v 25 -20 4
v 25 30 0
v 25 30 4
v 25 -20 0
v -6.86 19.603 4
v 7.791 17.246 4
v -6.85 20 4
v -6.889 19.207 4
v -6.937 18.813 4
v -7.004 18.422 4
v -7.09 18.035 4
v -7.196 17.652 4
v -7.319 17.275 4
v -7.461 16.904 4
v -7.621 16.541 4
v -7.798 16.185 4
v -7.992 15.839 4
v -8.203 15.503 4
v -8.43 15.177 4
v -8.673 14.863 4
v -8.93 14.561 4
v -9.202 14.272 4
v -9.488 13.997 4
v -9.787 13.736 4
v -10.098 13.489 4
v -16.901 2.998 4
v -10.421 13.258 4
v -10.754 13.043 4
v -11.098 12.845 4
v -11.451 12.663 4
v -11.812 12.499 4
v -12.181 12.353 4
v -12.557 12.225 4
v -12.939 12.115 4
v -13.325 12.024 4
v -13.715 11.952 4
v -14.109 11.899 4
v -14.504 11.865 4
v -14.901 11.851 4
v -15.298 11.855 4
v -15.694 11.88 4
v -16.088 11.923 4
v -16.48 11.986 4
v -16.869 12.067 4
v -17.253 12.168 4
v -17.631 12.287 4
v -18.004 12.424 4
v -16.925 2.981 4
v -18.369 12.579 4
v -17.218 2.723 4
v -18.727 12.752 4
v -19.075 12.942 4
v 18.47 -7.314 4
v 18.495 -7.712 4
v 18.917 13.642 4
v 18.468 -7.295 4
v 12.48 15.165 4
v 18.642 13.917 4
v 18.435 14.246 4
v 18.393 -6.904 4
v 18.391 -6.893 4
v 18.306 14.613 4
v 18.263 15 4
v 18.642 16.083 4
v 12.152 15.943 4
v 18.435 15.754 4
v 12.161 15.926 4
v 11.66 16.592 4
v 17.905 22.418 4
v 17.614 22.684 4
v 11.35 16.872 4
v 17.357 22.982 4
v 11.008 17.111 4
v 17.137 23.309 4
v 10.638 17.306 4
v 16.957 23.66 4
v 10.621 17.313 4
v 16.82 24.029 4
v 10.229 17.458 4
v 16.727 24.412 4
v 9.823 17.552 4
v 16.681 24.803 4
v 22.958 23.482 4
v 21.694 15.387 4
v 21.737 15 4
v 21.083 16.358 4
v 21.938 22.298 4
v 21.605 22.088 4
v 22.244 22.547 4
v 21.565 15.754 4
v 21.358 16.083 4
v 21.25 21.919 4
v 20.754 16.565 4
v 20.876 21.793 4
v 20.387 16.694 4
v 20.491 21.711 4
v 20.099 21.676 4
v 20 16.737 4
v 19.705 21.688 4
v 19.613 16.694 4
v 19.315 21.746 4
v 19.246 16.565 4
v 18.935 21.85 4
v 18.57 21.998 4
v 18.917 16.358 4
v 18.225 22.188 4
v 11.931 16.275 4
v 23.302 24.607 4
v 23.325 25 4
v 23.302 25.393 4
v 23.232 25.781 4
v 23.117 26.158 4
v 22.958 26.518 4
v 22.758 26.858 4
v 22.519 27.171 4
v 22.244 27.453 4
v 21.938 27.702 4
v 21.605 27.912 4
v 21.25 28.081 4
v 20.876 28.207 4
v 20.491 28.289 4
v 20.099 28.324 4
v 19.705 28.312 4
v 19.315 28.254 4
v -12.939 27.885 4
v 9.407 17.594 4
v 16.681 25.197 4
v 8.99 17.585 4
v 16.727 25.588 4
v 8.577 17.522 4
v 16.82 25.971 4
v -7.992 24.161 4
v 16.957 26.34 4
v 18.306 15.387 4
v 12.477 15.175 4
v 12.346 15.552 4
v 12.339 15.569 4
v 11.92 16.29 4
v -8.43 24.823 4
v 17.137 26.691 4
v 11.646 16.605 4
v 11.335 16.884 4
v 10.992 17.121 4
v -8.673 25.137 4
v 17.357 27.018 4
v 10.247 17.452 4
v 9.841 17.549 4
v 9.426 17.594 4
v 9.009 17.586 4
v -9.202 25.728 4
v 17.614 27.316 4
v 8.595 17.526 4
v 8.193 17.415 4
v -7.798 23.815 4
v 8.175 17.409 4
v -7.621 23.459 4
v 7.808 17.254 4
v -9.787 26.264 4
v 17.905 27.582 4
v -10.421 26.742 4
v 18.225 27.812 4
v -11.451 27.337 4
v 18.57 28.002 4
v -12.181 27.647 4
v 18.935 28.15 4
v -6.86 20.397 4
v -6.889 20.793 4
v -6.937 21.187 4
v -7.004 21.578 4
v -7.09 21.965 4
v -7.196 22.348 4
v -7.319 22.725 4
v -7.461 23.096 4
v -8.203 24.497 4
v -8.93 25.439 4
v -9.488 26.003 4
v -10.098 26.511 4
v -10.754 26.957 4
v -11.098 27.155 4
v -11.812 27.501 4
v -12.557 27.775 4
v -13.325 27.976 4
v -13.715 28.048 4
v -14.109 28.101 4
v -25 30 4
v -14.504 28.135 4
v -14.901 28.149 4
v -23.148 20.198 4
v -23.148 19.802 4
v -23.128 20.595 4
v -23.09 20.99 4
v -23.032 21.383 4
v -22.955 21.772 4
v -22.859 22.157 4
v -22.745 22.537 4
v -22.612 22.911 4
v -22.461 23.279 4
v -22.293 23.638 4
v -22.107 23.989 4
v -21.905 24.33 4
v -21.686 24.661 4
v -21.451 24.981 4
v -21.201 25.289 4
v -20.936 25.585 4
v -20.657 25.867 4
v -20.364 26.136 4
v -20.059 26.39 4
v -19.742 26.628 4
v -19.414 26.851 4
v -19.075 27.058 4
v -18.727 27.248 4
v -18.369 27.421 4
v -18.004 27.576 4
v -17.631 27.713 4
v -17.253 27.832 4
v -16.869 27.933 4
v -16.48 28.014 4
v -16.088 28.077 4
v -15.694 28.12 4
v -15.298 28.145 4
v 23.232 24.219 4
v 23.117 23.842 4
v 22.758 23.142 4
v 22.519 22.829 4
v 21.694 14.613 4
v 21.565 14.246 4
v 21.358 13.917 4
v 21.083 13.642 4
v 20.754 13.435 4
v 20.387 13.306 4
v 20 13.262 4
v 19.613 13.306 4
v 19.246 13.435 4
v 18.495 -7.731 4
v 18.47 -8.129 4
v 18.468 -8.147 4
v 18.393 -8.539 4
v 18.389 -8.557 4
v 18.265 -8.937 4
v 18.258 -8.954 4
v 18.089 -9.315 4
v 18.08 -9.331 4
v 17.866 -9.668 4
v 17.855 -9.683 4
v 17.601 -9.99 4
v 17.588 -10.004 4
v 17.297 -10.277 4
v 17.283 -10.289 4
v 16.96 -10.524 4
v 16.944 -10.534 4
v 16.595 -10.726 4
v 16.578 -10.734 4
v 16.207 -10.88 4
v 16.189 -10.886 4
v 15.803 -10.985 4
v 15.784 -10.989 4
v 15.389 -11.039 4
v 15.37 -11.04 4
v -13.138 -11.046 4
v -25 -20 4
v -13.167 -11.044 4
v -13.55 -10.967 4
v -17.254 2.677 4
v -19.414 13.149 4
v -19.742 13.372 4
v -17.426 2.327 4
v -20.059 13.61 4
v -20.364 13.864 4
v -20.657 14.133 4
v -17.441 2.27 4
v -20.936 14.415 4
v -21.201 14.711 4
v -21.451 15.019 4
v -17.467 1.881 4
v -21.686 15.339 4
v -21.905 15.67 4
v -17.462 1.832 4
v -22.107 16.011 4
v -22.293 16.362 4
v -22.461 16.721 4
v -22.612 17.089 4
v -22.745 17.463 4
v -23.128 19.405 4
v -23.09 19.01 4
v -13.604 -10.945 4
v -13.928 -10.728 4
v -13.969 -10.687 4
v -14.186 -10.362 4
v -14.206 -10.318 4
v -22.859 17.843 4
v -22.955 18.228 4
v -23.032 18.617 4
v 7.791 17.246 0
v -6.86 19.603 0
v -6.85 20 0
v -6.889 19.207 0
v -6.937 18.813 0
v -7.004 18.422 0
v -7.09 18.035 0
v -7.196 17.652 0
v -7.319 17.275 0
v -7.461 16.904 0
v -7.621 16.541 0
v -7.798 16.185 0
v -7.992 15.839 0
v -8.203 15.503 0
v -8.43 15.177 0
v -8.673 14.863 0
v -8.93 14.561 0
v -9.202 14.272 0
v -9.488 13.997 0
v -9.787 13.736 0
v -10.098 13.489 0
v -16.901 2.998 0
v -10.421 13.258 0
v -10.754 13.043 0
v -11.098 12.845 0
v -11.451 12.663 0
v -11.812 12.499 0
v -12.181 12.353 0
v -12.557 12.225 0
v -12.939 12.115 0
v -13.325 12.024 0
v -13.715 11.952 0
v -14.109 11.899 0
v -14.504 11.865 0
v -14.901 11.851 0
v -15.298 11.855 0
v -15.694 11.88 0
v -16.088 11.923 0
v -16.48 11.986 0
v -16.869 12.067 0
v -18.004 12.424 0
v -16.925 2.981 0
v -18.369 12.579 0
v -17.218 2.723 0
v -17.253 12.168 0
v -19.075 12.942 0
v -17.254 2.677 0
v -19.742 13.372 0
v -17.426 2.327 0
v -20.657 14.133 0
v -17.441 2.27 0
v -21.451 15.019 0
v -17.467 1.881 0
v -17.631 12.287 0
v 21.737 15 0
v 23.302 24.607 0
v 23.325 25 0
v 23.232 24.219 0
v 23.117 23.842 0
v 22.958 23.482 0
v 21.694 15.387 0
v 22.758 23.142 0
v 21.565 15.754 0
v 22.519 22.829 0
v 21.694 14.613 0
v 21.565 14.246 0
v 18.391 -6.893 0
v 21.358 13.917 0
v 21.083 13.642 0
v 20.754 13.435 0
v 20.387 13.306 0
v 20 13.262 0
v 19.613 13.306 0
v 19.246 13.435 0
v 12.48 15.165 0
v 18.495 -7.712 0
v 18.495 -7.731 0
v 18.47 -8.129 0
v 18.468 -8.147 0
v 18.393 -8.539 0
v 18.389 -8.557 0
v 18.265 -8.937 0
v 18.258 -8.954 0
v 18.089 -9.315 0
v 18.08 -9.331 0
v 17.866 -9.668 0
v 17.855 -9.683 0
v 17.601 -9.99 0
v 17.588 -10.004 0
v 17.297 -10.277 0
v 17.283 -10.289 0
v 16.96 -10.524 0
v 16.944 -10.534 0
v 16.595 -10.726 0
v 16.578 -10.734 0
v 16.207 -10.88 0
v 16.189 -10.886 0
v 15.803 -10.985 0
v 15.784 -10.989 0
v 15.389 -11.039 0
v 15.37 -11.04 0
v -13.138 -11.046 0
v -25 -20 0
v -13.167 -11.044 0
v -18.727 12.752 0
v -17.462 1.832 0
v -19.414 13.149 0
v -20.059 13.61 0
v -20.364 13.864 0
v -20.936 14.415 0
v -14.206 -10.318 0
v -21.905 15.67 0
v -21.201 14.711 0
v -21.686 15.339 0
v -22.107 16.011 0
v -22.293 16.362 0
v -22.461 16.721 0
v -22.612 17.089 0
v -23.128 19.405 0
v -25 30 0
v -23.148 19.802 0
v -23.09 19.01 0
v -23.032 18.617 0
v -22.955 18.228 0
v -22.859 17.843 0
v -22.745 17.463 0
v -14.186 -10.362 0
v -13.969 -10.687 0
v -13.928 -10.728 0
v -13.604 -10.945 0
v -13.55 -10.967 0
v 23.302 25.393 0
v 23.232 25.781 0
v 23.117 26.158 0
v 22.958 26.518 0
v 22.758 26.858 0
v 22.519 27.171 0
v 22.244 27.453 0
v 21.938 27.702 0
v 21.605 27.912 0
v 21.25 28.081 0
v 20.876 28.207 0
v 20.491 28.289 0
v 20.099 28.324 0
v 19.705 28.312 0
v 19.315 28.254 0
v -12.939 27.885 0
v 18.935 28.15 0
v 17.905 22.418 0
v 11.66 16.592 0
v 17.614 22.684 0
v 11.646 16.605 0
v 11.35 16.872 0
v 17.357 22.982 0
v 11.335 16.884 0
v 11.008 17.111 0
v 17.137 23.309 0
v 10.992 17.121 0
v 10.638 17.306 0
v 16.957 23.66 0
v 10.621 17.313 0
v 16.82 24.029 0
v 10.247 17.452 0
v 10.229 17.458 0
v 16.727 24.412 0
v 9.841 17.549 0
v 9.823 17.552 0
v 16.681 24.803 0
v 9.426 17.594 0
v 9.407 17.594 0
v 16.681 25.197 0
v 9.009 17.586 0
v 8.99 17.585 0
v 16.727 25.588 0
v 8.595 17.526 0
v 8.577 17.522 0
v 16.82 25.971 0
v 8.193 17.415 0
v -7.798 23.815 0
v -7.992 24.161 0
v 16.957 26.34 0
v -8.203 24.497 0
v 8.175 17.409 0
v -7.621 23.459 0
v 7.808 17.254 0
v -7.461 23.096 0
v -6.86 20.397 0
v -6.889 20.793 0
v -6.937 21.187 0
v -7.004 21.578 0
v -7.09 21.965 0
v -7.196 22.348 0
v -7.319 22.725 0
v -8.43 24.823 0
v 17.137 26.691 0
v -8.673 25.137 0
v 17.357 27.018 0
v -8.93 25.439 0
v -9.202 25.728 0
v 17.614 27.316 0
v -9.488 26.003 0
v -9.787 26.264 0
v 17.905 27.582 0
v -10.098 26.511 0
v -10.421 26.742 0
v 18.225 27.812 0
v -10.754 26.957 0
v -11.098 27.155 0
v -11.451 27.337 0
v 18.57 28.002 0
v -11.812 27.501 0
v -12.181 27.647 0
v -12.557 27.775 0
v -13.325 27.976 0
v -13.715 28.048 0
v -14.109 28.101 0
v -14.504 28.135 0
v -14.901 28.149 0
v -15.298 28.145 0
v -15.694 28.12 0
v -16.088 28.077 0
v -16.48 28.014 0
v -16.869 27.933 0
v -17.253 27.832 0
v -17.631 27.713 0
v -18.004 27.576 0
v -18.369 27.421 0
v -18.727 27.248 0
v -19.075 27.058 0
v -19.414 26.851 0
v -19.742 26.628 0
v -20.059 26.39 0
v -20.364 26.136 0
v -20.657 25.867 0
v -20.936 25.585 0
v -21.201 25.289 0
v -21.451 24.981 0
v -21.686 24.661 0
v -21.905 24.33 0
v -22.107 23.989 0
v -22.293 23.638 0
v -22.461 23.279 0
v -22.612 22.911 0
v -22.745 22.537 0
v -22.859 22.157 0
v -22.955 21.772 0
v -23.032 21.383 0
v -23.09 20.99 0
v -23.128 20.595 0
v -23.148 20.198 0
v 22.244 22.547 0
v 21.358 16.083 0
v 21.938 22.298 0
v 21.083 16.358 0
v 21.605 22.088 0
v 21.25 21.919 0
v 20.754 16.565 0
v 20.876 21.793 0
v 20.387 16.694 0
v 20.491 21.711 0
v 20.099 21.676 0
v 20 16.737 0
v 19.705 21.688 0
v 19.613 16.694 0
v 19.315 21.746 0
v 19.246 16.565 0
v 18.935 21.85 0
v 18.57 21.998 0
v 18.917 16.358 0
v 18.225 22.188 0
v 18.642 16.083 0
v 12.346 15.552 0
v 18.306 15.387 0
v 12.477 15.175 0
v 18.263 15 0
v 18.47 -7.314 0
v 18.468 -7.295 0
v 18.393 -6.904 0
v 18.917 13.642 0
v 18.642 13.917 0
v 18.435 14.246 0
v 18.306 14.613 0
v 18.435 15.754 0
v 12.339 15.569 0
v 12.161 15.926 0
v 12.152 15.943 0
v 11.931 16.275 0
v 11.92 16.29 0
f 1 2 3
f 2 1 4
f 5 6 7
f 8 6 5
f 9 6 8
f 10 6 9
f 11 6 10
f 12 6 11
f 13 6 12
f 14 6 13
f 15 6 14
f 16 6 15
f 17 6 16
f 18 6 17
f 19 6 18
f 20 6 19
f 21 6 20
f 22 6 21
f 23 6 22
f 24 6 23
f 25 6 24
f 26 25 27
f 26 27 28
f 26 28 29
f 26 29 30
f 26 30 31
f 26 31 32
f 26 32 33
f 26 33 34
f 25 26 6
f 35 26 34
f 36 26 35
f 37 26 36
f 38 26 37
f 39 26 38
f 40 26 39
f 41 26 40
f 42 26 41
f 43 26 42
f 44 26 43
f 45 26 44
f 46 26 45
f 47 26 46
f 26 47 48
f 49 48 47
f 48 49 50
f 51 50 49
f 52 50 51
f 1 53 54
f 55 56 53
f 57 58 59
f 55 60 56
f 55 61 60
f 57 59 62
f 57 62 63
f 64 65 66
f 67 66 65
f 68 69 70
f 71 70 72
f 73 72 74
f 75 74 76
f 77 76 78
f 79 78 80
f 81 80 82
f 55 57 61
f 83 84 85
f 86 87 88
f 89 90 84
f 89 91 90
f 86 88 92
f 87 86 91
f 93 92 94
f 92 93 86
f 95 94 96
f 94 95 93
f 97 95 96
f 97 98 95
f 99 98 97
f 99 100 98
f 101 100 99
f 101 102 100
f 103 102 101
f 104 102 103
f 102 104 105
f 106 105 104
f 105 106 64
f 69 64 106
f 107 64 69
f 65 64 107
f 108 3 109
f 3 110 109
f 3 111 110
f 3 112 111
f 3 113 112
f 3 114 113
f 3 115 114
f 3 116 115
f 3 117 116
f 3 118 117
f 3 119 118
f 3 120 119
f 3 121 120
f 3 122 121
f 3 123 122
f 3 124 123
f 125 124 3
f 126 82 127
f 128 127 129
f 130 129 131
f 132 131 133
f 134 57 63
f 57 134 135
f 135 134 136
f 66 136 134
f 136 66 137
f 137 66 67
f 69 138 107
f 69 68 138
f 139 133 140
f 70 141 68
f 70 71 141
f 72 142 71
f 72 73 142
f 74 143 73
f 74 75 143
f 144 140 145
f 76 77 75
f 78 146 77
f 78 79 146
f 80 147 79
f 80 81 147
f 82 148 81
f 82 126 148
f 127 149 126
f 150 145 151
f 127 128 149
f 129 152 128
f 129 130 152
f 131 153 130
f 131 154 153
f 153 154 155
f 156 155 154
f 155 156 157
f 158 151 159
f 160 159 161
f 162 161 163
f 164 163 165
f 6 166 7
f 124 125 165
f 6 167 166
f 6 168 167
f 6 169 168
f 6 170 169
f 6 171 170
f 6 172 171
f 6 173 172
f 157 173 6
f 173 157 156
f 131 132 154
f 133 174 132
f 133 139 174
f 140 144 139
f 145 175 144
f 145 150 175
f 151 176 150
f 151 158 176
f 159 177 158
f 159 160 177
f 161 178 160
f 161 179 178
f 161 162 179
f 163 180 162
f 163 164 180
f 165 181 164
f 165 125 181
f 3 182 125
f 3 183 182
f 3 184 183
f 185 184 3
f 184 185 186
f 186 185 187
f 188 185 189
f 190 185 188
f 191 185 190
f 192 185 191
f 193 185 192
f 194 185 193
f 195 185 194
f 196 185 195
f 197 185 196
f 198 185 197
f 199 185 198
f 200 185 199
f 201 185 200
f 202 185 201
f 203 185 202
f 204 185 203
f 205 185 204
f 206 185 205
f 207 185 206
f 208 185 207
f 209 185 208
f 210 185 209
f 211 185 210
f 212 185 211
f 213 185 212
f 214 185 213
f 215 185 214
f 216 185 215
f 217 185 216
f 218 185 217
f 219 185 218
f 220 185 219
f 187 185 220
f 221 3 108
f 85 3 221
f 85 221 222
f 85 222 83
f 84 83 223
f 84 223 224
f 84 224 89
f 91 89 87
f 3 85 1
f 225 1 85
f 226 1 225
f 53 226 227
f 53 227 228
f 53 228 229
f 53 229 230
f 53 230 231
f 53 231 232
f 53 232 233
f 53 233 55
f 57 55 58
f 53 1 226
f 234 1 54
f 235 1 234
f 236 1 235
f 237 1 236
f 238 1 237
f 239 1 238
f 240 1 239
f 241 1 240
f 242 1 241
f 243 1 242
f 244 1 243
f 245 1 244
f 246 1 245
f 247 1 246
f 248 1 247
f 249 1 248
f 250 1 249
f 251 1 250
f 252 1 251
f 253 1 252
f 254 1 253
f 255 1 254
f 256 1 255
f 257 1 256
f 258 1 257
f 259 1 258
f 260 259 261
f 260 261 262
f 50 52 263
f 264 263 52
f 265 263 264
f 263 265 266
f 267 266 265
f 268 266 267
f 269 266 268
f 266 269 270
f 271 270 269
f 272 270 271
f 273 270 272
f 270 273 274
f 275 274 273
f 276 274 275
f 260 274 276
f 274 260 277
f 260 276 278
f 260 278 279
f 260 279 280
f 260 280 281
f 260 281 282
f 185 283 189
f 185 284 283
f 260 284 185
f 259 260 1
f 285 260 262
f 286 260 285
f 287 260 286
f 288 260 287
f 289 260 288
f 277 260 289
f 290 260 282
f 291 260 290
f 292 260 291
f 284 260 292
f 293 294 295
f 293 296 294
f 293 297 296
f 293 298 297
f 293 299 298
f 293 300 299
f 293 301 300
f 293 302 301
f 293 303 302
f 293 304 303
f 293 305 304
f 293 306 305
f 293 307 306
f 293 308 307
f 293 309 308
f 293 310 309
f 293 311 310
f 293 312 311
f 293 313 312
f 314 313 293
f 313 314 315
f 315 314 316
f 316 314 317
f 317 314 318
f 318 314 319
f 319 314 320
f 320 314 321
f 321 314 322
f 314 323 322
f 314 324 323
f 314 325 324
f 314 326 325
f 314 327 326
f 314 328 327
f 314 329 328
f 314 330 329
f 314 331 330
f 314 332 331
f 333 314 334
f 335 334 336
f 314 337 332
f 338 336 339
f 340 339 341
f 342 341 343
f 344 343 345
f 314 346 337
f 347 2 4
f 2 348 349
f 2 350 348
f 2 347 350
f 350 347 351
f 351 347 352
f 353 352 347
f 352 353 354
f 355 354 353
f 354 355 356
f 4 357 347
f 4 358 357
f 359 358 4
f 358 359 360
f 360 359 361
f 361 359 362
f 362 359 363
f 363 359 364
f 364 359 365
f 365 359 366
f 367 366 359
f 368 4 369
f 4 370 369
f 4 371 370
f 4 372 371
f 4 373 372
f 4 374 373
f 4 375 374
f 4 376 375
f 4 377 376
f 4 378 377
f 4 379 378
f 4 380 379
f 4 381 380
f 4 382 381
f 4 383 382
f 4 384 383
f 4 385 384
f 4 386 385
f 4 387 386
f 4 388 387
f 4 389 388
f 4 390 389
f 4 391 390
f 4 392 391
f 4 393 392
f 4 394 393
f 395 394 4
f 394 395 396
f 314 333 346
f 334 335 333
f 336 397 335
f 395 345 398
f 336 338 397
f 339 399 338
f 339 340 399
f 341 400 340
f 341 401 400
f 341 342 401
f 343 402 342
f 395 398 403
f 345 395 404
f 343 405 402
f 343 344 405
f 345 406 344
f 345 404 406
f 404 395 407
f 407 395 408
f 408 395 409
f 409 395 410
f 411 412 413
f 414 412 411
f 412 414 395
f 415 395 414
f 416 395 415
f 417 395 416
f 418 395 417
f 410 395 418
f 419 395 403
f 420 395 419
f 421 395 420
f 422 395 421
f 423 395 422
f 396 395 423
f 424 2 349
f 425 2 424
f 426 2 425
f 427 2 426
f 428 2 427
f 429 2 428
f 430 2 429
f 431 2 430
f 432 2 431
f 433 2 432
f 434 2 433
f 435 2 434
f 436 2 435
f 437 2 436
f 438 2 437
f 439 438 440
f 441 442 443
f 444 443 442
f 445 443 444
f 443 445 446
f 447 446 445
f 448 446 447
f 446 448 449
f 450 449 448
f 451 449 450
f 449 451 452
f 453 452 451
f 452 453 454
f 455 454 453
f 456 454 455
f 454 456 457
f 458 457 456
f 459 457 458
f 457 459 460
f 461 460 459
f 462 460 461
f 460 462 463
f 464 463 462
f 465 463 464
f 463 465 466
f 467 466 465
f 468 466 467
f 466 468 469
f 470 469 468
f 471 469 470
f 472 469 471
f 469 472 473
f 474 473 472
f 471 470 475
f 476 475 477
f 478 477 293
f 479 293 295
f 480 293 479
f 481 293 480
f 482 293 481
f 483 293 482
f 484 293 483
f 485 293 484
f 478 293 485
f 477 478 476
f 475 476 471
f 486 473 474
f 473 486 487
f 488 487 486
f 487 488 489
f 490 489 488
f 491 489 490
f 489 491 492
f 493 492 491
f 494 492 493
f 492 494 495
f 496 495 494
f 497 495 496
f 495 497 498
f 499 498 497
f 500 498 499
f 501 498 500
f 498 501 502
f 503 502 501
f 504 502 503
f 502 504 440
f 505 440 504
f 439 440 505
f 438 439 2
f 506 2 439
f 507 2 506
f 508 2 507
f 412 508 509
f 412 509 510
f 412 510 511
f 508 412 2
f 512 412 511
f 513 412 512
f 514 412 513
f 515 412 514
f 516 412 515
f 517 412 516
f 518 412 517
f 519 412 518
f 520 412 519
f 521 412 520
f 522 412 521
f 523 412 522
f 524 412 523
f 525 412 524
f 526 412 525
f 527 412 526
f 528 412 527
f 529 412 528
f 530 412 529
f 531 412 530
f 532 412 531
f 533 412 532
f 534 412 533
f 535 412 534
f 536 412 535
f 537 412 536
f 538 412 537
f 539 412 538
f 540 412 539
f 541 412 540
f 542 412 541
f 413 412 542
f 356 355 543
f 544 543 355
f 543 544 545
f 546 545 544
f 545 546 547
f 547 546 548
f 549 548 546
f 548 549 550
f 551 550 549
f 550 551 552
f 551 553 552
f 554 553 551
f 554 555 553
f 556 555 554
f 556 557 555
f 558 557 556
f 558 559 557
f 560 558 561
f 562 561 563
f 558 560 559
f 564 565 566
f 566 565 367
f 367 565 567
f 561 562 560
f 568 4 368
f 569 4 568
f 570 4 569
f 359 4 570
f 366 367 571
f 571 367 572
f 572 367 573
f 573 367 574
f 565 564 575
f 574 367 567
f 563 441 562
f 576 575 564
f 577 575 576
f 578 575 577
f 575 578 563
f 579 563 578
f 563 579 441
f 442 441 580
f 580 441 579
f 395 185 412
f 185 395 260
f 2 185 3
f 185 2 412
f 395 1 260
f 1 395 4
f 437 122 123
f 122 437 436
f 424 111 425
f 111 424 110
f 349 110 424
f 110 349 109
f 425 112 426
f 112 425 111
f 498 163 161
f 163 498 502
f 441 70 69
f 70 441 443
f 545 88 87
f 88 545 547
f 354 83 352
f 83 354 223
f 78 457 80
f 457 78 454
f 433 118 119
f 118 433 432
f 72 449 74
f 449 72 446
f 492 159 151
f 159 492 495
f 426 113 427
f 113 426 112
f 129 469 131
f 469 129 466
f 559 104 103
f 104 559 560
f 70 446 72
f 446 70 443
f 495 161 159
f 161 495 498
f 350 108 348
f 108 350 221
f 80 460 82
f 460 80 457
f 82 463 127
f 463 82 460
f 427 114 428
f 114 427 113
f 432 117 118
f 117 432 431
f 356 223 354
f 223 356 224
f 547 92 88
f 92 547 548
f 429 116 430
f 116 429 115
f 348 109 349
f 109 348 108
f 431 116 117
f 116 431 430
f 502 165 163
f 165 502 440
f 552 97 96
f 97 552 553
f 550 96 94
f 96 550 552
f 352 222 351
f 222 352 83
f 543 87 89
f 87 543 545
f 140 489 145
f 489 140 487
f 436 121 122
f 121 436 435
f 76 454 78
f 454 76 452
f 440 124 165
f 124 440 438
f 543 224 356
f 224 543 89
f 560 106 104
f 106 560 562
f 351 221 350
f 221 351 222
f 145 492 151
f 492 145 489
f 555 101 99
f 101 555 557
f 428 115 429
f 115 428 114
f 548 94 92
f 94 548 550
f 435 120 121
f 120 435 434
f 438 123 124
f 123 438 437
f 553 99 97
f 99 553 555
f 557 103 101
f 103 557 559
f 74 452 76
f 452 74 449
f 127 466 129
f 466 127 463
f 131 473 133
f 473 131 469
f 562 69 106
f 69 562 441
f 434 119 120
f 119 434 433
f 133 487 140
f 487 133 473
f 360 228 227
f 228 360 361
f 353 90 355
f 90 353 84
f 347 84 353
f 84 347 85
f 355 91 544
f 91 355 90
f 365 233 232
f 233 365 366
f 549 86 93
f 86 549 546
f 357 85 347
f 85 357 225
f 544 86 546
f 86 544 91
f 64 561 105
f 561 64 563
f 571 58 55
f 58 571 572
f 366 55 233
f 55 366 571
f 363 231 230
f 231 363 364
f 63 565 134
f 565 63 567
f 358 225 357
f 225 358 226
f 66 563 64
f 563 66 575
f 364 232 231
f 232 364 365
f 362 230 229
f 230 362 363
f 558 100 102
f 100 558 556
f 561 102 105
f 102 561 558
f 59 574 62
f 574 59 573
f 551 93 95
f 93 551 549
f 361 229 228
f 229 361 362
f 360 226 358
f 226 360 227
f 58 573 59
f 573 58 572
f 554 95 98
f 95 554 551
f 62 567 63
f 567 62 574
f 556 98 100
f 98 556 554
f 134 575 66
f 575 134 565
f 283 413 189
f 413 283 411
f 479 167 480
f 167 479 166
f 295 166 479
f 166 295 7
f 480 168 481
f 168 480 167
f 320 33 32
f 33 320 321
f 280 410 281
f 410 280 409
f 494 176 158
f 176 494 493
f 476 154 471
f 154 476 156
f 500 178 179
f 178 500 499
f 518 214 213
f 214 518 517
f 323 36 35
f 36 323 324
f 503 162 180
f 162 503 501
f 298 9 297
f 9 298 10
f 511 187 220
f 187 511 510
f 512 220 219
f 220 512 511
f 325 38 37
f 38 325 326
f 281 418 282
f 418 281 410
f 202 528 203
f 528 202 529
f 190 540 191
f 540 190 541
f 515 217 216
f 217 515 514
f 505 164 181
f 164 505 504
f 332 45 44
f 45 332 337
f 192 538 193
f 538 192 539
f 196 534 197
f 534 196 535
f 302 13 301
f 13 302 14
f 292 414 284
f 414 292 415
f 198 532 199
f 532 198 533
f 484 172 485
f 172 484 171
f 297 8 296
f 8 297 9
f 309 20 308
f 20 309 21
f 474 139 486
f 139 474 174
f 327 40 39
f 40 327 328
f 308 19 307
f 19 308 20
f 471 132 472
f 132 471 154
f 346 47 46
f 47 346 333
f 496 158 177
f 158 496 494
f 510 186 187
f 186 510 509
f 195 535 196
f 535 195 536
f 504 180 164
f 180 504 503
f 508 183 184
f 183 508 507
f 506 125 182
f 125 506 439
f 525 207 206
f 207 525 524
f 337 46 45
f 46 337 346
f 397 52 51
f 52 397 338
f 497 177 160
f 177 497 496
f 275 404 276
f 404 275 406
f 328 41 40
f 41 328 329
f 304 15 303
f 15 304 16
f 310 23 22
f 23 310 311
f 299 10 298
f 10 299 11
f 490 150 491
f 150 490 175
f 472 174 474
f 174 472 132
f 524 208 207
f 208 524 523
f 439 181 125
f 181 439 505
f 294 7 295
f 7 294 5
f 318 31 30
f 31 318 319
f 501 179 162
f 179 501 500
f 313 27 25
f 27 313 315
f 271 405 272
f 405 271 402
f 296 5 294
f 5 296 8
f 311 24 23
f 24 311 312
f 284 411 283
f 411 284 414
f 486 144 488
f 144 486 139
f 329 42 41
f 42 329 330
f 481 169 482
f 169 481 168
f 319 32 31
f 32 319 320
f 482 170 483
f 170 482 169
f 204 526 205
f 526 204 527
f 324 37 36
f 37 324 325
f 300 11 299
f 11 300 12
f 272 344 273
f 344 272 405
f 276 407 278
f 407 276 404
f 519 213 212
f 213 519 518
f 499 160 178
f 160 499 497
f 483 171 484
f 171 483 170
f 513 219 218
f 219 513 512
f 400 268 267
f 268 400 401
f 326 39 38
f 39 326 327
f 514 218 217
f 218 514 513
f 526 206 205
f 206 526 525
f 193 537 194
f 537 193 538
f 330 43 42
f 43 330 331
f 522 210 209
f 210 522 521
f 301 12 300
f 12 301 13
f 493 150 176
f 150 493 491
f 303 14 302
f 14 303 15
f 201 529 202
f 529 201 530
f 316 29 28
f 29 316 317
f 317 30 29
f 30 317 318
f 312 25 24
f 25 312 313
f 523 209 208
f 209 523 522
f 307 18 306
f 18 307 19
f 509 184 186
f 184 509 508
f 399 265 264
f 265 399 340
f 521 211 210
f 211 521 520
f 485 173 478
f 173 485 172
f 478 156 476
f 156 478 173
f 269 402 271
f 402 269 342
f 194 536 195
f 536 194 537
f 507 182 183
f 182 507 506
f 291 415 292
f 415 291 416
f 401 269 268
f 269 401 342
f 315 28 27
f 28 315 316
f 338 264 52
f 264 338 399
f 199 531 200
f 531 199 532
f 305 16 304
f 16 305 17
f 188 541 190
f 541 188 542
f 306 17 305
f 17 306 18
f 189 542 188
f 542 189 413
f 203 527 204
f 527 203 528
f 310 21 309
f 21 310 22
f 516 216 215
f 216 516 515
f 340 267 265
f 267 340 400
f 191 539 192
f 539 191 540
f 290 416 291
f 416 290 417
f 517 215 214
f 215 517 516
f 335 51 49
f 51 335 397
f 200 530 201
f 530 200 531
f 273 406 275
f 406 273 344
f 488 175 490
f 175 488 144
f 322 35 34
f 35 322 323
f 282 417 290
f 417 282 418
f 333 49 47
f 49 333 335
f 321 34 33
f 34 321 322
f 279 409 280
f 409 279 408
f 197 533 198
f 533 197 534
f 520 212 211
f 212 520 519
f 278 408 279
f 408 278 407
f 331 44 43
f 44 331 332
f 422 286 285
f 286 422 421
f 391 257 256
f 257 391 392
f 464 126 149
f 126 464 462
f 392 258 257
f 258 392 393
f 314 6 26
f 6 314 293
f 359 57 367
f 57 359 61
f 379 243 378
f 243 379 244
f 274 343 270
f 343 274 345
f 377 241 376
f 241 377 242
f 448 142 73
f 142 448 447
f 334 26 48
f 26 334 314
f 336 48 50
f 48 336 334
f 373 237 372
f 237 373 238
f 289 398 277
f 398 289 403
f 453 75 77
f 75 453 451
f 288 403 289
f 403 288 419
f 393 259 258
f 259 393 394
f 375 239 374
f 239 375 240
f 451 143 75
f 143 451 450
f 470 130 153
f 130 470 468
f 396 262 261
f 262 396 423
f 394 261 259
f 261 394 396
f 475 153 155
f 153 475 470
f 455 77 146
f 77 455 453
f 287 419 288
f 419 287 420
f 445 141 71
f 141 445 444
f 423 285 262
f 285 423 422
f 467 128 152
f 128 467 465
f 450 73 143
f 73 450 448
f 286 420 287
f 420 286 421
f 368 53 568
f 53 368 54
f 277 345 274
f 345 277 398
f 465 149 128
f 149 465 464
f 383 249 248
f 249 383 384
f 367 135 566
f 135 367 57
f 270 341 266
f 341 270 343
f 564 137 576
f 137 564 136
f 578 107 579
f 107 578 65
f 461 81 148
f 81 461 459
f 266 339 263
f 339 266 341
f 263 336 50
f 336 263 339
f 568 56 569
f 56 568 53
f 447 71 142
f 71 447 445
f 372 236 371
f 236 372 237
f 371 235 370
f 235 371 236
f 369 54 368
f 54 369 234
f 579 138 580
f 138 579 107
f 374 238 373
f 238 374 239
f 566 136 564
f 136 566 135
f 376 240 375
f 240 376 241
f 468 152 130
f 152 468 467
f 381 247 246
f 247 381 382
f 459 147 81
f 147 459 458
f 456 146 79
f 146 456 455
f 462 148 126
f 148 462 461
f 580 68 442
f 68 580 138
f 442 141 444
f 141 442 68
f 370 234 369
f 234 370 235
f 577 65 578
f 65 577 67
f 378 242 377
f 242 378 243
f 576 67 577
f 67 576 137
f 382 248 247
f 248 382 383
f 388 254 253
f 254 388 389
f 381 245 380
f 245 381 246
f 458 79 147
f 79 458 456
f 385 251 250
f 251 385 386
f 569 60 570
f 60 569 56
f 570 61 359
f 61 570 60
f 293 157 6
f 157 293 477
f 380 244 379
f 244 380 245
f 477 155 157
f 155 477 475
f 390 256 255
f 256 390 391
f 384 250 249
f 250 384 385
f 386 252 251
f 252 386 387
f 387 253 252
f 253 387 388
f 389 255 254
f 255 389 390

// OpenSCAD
include <MCAD/bearing.scad>

// ---------------------------
// Constants
// ---------------------------
$fa = 1;
$fs = 0.4;
in_to_mm = 25.4;
gap = 1.25; //1/32 * in_to_mm;
nut_gap = 7;//3/4 * in_to_mm;
eps = .15;

bearingModel = 688; //608
bearing_w = bearingWidth(bearingModel);
bearing_or = bearingOuterDiameter(bearingModel)/2;
bearing_ir = bearingInnerDiameter(bearingModel)/2;


// ---------------------------
// Variables
// ---------------------------
num_holes=12;
sectors = num_holes;
sector_degrees = 360 / sectors;

mag1_hole_d = (1/4 * in_to_mm);
mag1_hole_r = (mag1_hole_d/2);
mag1_w = 1/4 * in_to_mm;

mag2_hole_d = (1/8 * in_to_mm);
mag2_hole_r = (mag2_hole_d/2);
mag2_w = 1/4 * in_to_mm;

mag_space_1 = 3;
mag_space_2 = 2;

cir = num_holes*2*(mag1_hole_d-mag_space_2/2);
temp_r = cir/(3.14159*2);
min_r = bearing_or + mag1_hole_d + mag2_hole_d + mag_space_2+3;
central_r3 = max(temp_r, min_r);
central_r2 = central_r3 + mag2_hole_r + mag_space_2 + mag2_hole_r;
central_r = central_r2 + mag2_hole_r + mag_space_1 + mag1_hole_r;
disk_r = central_r+2;

coil_cap_w = .6;
coil_w = bearing_w-1;//5;//(1/8 * in_to_mm = 3.175);
coil_hole_r = mag1_hole_r*3;
coil_hole_d = coil_hole_r*2;
coil_holder_r = mag1_hole_r;
coil_holder_bolt_r = 2;
coil_holder_top_insert_h = 1;
coil_holder_inner_shell_t = 2;
coil_holder_center_cyl_t = 1.5;
coil_center_hole_r = bearing_or+eps; //7

coil_holder_hull_r = 1;
coil_holder_out_r1 = central_r3-mag1_hole_r-mag2_hole_r-mag_space_2;
coil_holder_out_x1 = coil_holder_out_r1-coil_holder_hull_r/num_holes;
coil_holder_out_y1 = mag1_hole_r-coil_holder_hull_r;
coil_holder_out_r2 = central_r+mag1_hole_d+mag_space_1;
coil_holder_out_x2 = coil_holder_out_r2+mag1_hole_r-coil_holder_hull_r*4;
coil_holder_out_y2 = mag1_hole_r-coil_holder_hull_r;

coil_holder_in_x1 = coil_holder_out_r1+mag1_hole_r+coil_holder_hull_r/2;
coil_holder_in_y1 = mag1_hole_r+coil_holder_hull_r;
coil_holder_in_x2 = coil_holder_out_r2-mag1_hole_r-coil_holder_hull_r*2;
coil_holder_in_y2 = mag1_hole_r+coil_holder_hull_r;
coil_holder_in_len = coil_holder_in_x2 - coil_holder_in_x1 + coil_holder_hull_r*2;
coil_holder_center_r = coil_holder_out_x1 + (coil_holder_out_x2 - coil_holder_out_x1)/2;
echo(str("coil_holder_in_len:", coil_holder_in_len));

base_d = 100;
base_r = base_d/2;  //central_r + coil_hole_d;
base_w = 3; //bearing_w/1.75
base_l = 70; //3.5 * in_to_mm; 66.4
base_lc = nut_gap + gap + mag2_w + gap + coil_w +gap + mag1_w + gap + coil_w + gap + mag1_w + gap + coil_w + gap + mag2_w + gap + nut_gap;
base_side_h = 15;
alignment_bolt_r = 3.9/2;

axel_h = gap+coil_w+gap;
axel_ir = bearing_ir+.1;
axel_or = coil_center_hole_r-1;

echo(str("sector_degrees:", sector_degrees));
echo(str("coil_w:", coil_w));
echo(str("bearing_w:", bearing_w));
echo(str("mag1_w:", mag1_w));
echo(str("mag1_hole_r:", mag1_hole_r));


render_mode = "TEST"; //"FULL", "PRINT", "TEST";
print_mode = "COIL"; //"MAG1","COIL","HOLDERS";

// Main rendering code
if (render_mode=="FULL") {
    renderFull();
} else if (render_mode=="PRINT") {
    renderPrint();
} else if (render_mode=="TEST") {
    renderTest();
}

module renderFull() {
    coilDisk(diskNum=1, bearing=true);
    z_offset = (mag1_w + bearing_w)/2;
    inv_num_holes = 1/num_holes;
    tmp_t = inv_num_holes*2; //0=blue, 1=white, 2=yellow, 3=green
    rotate([0,0,(-sector_degrees/(num_holes/2))*$t*num_holes]) {
    //rotate([0,0,(-sector_degrees/(num_holes/2))*tmp_t*num_holes]) {
        translate([0,0,z_offset])
        %mag1Disk();
        translate([0,0,-z_offset])
        %mag1Disk();
    }

    tr1=1;//3/num_holes;//0.0;//0.125;
    color( "yellow", 1.0 ) {
        rotate([0,0,(-sector_degrees/2)*tr1]) {
            coilHoldersVisual();
        }
    }
//    tr2=0.5;
//    color( "white", 1.0 ) {
//        rotate([0,0,(-sector_degrees/2)*tr2]) {
//            coilHoldersVisual();
//        }
//    }
//    tr3=1.5;
//    color( "green", 1.0 ) {
//        rotate([0,0,(-sector_degrees/2)*tr3]) {
//            coilHoldersVisual();        
//        }
//    }
//    tr4=2;
//    color( "blue", 1.0 ) {
//        rotate([0,0,(-sector_degrees/2)*tr4]) {    
//            coilHoldersVisual();    
//        }
//    }    
}

module renderPrint() {
    if (print_mode=="MAG1") {
        // Magnet Disk1
        mag1Disk();
    } else if (print_mode=="COIL") {
        // COIL Disk
        if (num_holes==12) {
            coilDisk(diskNum=3);
        } else {
            coilDisk();
        }
    } else if (print_mode=="HOLDERS") {
        // Wire coil holders
        printCoilHolderTopAndBot();
    }
}

// ---------------------------------------
// Stationary Coil Disk Modules
// ---------------------------------------

// Stationary Disk with trapezoid coils
module coilDisk(w=coil_w, diskNum=1, wires=true, bearing=false) {
    x = base_d-1.5;
    y = x;
    small_hole_r = 1;
    small_hole_or = central_r+mag1_hole_d+coil_hole_r-5;
    // Disk
    difference() {
        //main structure
        cube([x, y, w], center=true);
        //remove trapezoids for coils
        rotate([0,0,(-sector_degrees/2)*diskNum]) {
            translate([0,0,-w])coilHoldersOutline(w=w*2,offset_r=eps);
        }
        // remove center hole for bearing
        cylinder(h=w*2,r=coil_center_hole_r,center=true);
        // remove holes for wires
        if (wires == true) {
            //wireChannelsStraight();
            structureHoles(w=w,radius=small_hole_or, hole_r=small_hole_r);
        }
        alignmentBoltHoles(w=w);
    }
    if (bearing == true) {
        translate([0, 0, -bearing_w/2])
        bearing(model=bearingModel, outline=false);
    }
}

//alignment_bolt_r
module alignmentBoltHoles(w=coil_w, r=alignment_bolt_r, i=10) {
    translate([base_r-i,base_r-i,0])cylinder(h=w*2,r=r,center=true);
    translate([-base_r+i,base_r-i,0])cylinder(h=w*2,r=r,center=true);
    translate([base_r-i,-base_r+i,0])cylinder(h=w*2,r=r,center=true);
    translate([-base_r+i,-base_r+i,0])cylinder(h=w*2,r=r,center=true);
}

module wireChannelsStraight() {
    radius = central_r+mag1_hole_d;
    sectors = num_holes/2;
    degrees = 360 / sectors;
    cyl_h = radius*(12/num_holes)-2;
    
    for(sector = [1 : sectors]) {
        angle = degrees * sector;
        x_pos = radius * sin(angle);
        y_pos = radius * cos(angle);
        x_off = (coil_hole_r) * cos(angle);
        y_off = (coil_hole_r) * sin(angle);
        cross_angle_1 = degrees/2-(angle+90);
        cross_angle_2 = degrees/2-(angle+degrees-90);
        rotate([0,0,degrees/2]) {
            translate([x_pos+y_off,y_pos+x_off,coil_w/2]){
                rotate([90,0,cross_angle_1])cylinder(h=cyl_h,r=coil_w/4,center=false);
            }
        }
        rotate([0,0,degrees/2]) {
            translate([x_pos+y_off,y_pos+x_off,coil_w/2]){
                rotate([90,0,cross_angle_2])cylinder(h=cyl_h,r=coil_w/4,center=false);
            }
        }
    }    
}

// ---------------------------------------
// Rotating Magnet Disk Modules
// ---------------------------------------

// Rotating Disk with magnets #1
module mag1Disk(w=mag1_w) {
    border = mag1_hole_r*1.5;
    mag1_disk_r = central_r + border;
    
    // Disk
    difference() {
        cylinder(h=w,r=mag1_disk_r,center=true);
        //remove holes for outer magnets
        holes(w*2, mag1_hole_r+eps);
        //remove holes for center magnets
        holes(w*2, mag2_hole_r+eps, radius=central_r2);
        //remove holes for inner magnets
        holes(w*2, mag2_hole_r+eps, radius=central_r3);
        //remove hole for main axel
        cylinder(h=w*2,r=axel_ir,center=true);
    }
}


// ---------------------------------------
// Coil Holder Modules
// ---------------------------------------

module printCoilHolderTopAndBot() { 
    centerCoilHolder() {
        coilHolderBottom();
    }    
    translate([0,-coil_holder_center_r-2,0])rotate([0,0,180]){
        centerCoilHolder() {
            coilHolderTop();
        }    
    }
}

module centerCoilHolder() { 
    angle = 90-(sector_degrees/2);
    radius = coil_holder_center_r;
    x_pos = radius * sin(angle);
    y_pos = radius * cos(angle);

    translate([-x_pos,-y_pos,0]) children(); 
}

module coilHolderBottom() {
    h=coil_w-coil_cap_w;
    difference() {
        union() {
            coilHolderCap(holes=true);
            innerCoilHolderShell(h=h);
            coilHolderCenterCylinder(h=h);
        }
        coilHolderCenterBoltHole();
    }
}

module innerCoilHolderShell(h=coil_w) {
    linear_extrude(height=h, slices=10) {
        difference() {
            innerCoilHolder2d();
            offset(r=-coil_holder_inner_shell_t) {
                innerCoilHolder2d();
            }
        }
    }
}

module coilHolderTop() {
    difference() {
        union() {
            coilHolderCap();
            coilHolderTopInsert();
        }
        coilHolderCenterCylinder(t=coil_holder_center_cyl_t+eps,z=coil_cap_w);
        coilHolderCenterBoltHole();
    }
}

module coilHolderTopInsert(h=coil_holder_top_insert_h, z=coil_cap_w) {
    translate([0,0,z]) {
        linear_extrude(height=h, slices=1) {
            offset(r=-(coil_holder_inner_shell_t+eps)) {
                innerCoilHolder2d();
            }
        }
    }
}

module coilHolderCap(w=coil_cap_w, holes=false) {
    translate([0,0,w/2])outerCoilHolder(w=w, holes=holes);
}

module coilHolderCenterCylinder(h=coil_w, r=coil_holder_bolt_r, t=coil_holder_center_cyl_t, z=0) {
    rotate([0,0,(sector_degrees/2)])
        translate([coil_holder_center_r,0,z]) 
            cylinder(h=h,r=r+t);
}

module coilHolderCenterBoltHole() {
    coilHolderCenterCylinder(h=coil_w*3,t=eps,z=-coil_w);
}

// Coil Holders Visual
module coilHoldersVisual(w=coil_w) {
    for(sector = [0 : 2 : sectors]) {
        rotate([0,0,sector_degrees*sector]) { 
            outerCoilHolder(w=w);
            #innerCoilHolder(w=w+2);
        }
    }    
}

module coilHoldersOutline(w=coil_w, offset_r=0) {
    for(sector = [0 : 2 : sectors]) {
        rotate([0,0,sector_degrees*sector]) { 
            outerCoilHolder(w=w,offset_r=offset_r);
        }
    }    
}

// Outer coil holder
module outerCoilHolder(w=coil_w, offset_r=0, holes=false) {
    difference() {
        linear_extrude(height=w, slices=1) {
            offset(r=offset_r) {
                outerCoilHolder2d();
            }
        }
        
//        hull() {
//            translate([coil_holder_out_x1, -coil_holder_out_y1, 0])
//            cylinder(h=w,r=coil_holder_hull_r,center=true);
//            translate([coil_holder_out_x2, 0, 0])
//            cylinder(h=w,r=mag1_hole_r,center=true);
//
//            rotate([0,0,sector_degrees]) {
//                translate([coil_holder_out_x1, coil_holder_out_y1, 0])
//                cylinder(h=w,r=coil_holder_hull_r,center=true);
//                translate([coil_holder_out_x2, 0, 0])
//                cylinder(h=w,r=mag1_hole_r,center=true);
//            }
//        }
        if (holes == true) {
            translate([coil_holder_out_x2+mag1_hole_r/1.1, 0, 0])
            cylinder(h=w*2,r=1,center=true);
            rotate([0,0,sector_degrees]) {
                translate([coil_holder_out_x2, 0, 0])
                cylinder(h=w*2,r=1,center=true);
            }
            
        }
    }
}

module outerCoilHolder2d(w=coil_w, offset_r=0) {
    hull() {
        translate([coil_holder_out_x1, -coil_holder_out_y1, 0])
        circle(r=coil_holder_hull_r);
        translate([coil_holder_out_x2, 0, 0])
        circle(r=mag1_hole_r);

        rotate([0,0,sector_degrees]) {
            translate([coil_holder_out_x1, coil_holder_out_y1, 0])
            circle(r=coil_holder_hull_r);
            translate([coil_holder_out_x2, 0, 0])
            circle(r=mag1_hole_r);
        }
    }
}


// Inner coil holder
module innerCoilHolder(w=coil_w) {
    hull() {
        translate([coil_holder_in_x1, coil_holder_in_y1, 0])
        cylinder(h=w,r=coil_holder_hull_r,center=true);
        translate([coil_holder_in_x2, coil_holder_in_y2, 0])
        cylinder(h=w,r=coil_holder_hull_r,center=true);

        rotate([0,0,sector_degrees]) {
        translate([coil_holder_in_x1, -coil_holder_in_y1, 0])
        cylinder(h=w,r=coil_holder_hull_r,center=true);
        translate([coil_holder_in_x2, -coil_holder_in_y2, 0])
        cylinder(h=w,r=coil_holder_hull_r,center=true);
        }
    }
}

// Inner coil holder 2D
module innerCoilHolder2d() {
    hull() {
        translate([coil_holder_in_x1, coil_holder_in_y1, 0])
        circle(r=coil_holder_hull_r);
        translate([coil_holder_in_x2, coil_holder_in_y2, 0])
        circle(r=coil_holder_hull_r);

        rotate([0,0,sector_degrees]) {
        translate([coil_holder_in_x1, -coil_holder_in_y1, 0])
        circle(r=coil_holder_hull_r);
        translate([coil_holder_in_x2, -coil_holder_in_y2, 0])
        circle(r=coil_holder_hull_r);
        }
    }
}


// ---------------------------------------
// Common Modules
// ---------------------------------------

module holes(w, hole_r, radius=central_r) {
    //radius = central_r;
    sectors = num_holes;
    sector_degrees = 360 / sectors;

    for(sector = [1 : sectors]) {
        angle = sector_degrees * sector;
        x_pos = radius * sin(angle);
        y_pos = radius * cos(angle);
        translate([x_pos,y_pos,0]){
            hole(w, hole_r);
        }
    }    
}

module structureHoles(w, radius, hole_r, sectors=num_holes) {
    sector_degrees = 360 / sectors;
    for(sector = [1 : 2 : sectors]) {
        angle = sector_degrees * sector;
        x_pos = radius * sin(angle);
        y_pos = radius * cos(angle);
        translate([x_pos,y_pos,0]){
            hole(w, hole_r);
        }
    }    
}

module hole(w, hole_r) {
    cylinder(h=w+2,r=hole_r,center=true);
}


// ---------------------------------------
// Test Print Module
// ---------------------------------------

module renderTest() {
    translate([0,0,coil_w/2]) {
        difference() {
            translate([0,5,0])cube([50,50,coil_w], center=true);
            
            //Big Magnet hole
            translate([20,25,0])hole(mag1_w, mag1_hole_r+eps); 

            //Small Magnet hole
            translate([20,15,0])hole(mag2_w, mag2_hole_r+eps); 
            
            //Bearing hole
            translate([-15,20,0])
            cylinder(h=bearing_w*2,r=coil_center_hole_r,center=true);
            
            //CoilHolder
            centerCoilHolder() {
                translate([0,0,-coil_w])outerCoilHolder(w=coil_w*2,offset_r=eps);
            }    
        }
    }
}
